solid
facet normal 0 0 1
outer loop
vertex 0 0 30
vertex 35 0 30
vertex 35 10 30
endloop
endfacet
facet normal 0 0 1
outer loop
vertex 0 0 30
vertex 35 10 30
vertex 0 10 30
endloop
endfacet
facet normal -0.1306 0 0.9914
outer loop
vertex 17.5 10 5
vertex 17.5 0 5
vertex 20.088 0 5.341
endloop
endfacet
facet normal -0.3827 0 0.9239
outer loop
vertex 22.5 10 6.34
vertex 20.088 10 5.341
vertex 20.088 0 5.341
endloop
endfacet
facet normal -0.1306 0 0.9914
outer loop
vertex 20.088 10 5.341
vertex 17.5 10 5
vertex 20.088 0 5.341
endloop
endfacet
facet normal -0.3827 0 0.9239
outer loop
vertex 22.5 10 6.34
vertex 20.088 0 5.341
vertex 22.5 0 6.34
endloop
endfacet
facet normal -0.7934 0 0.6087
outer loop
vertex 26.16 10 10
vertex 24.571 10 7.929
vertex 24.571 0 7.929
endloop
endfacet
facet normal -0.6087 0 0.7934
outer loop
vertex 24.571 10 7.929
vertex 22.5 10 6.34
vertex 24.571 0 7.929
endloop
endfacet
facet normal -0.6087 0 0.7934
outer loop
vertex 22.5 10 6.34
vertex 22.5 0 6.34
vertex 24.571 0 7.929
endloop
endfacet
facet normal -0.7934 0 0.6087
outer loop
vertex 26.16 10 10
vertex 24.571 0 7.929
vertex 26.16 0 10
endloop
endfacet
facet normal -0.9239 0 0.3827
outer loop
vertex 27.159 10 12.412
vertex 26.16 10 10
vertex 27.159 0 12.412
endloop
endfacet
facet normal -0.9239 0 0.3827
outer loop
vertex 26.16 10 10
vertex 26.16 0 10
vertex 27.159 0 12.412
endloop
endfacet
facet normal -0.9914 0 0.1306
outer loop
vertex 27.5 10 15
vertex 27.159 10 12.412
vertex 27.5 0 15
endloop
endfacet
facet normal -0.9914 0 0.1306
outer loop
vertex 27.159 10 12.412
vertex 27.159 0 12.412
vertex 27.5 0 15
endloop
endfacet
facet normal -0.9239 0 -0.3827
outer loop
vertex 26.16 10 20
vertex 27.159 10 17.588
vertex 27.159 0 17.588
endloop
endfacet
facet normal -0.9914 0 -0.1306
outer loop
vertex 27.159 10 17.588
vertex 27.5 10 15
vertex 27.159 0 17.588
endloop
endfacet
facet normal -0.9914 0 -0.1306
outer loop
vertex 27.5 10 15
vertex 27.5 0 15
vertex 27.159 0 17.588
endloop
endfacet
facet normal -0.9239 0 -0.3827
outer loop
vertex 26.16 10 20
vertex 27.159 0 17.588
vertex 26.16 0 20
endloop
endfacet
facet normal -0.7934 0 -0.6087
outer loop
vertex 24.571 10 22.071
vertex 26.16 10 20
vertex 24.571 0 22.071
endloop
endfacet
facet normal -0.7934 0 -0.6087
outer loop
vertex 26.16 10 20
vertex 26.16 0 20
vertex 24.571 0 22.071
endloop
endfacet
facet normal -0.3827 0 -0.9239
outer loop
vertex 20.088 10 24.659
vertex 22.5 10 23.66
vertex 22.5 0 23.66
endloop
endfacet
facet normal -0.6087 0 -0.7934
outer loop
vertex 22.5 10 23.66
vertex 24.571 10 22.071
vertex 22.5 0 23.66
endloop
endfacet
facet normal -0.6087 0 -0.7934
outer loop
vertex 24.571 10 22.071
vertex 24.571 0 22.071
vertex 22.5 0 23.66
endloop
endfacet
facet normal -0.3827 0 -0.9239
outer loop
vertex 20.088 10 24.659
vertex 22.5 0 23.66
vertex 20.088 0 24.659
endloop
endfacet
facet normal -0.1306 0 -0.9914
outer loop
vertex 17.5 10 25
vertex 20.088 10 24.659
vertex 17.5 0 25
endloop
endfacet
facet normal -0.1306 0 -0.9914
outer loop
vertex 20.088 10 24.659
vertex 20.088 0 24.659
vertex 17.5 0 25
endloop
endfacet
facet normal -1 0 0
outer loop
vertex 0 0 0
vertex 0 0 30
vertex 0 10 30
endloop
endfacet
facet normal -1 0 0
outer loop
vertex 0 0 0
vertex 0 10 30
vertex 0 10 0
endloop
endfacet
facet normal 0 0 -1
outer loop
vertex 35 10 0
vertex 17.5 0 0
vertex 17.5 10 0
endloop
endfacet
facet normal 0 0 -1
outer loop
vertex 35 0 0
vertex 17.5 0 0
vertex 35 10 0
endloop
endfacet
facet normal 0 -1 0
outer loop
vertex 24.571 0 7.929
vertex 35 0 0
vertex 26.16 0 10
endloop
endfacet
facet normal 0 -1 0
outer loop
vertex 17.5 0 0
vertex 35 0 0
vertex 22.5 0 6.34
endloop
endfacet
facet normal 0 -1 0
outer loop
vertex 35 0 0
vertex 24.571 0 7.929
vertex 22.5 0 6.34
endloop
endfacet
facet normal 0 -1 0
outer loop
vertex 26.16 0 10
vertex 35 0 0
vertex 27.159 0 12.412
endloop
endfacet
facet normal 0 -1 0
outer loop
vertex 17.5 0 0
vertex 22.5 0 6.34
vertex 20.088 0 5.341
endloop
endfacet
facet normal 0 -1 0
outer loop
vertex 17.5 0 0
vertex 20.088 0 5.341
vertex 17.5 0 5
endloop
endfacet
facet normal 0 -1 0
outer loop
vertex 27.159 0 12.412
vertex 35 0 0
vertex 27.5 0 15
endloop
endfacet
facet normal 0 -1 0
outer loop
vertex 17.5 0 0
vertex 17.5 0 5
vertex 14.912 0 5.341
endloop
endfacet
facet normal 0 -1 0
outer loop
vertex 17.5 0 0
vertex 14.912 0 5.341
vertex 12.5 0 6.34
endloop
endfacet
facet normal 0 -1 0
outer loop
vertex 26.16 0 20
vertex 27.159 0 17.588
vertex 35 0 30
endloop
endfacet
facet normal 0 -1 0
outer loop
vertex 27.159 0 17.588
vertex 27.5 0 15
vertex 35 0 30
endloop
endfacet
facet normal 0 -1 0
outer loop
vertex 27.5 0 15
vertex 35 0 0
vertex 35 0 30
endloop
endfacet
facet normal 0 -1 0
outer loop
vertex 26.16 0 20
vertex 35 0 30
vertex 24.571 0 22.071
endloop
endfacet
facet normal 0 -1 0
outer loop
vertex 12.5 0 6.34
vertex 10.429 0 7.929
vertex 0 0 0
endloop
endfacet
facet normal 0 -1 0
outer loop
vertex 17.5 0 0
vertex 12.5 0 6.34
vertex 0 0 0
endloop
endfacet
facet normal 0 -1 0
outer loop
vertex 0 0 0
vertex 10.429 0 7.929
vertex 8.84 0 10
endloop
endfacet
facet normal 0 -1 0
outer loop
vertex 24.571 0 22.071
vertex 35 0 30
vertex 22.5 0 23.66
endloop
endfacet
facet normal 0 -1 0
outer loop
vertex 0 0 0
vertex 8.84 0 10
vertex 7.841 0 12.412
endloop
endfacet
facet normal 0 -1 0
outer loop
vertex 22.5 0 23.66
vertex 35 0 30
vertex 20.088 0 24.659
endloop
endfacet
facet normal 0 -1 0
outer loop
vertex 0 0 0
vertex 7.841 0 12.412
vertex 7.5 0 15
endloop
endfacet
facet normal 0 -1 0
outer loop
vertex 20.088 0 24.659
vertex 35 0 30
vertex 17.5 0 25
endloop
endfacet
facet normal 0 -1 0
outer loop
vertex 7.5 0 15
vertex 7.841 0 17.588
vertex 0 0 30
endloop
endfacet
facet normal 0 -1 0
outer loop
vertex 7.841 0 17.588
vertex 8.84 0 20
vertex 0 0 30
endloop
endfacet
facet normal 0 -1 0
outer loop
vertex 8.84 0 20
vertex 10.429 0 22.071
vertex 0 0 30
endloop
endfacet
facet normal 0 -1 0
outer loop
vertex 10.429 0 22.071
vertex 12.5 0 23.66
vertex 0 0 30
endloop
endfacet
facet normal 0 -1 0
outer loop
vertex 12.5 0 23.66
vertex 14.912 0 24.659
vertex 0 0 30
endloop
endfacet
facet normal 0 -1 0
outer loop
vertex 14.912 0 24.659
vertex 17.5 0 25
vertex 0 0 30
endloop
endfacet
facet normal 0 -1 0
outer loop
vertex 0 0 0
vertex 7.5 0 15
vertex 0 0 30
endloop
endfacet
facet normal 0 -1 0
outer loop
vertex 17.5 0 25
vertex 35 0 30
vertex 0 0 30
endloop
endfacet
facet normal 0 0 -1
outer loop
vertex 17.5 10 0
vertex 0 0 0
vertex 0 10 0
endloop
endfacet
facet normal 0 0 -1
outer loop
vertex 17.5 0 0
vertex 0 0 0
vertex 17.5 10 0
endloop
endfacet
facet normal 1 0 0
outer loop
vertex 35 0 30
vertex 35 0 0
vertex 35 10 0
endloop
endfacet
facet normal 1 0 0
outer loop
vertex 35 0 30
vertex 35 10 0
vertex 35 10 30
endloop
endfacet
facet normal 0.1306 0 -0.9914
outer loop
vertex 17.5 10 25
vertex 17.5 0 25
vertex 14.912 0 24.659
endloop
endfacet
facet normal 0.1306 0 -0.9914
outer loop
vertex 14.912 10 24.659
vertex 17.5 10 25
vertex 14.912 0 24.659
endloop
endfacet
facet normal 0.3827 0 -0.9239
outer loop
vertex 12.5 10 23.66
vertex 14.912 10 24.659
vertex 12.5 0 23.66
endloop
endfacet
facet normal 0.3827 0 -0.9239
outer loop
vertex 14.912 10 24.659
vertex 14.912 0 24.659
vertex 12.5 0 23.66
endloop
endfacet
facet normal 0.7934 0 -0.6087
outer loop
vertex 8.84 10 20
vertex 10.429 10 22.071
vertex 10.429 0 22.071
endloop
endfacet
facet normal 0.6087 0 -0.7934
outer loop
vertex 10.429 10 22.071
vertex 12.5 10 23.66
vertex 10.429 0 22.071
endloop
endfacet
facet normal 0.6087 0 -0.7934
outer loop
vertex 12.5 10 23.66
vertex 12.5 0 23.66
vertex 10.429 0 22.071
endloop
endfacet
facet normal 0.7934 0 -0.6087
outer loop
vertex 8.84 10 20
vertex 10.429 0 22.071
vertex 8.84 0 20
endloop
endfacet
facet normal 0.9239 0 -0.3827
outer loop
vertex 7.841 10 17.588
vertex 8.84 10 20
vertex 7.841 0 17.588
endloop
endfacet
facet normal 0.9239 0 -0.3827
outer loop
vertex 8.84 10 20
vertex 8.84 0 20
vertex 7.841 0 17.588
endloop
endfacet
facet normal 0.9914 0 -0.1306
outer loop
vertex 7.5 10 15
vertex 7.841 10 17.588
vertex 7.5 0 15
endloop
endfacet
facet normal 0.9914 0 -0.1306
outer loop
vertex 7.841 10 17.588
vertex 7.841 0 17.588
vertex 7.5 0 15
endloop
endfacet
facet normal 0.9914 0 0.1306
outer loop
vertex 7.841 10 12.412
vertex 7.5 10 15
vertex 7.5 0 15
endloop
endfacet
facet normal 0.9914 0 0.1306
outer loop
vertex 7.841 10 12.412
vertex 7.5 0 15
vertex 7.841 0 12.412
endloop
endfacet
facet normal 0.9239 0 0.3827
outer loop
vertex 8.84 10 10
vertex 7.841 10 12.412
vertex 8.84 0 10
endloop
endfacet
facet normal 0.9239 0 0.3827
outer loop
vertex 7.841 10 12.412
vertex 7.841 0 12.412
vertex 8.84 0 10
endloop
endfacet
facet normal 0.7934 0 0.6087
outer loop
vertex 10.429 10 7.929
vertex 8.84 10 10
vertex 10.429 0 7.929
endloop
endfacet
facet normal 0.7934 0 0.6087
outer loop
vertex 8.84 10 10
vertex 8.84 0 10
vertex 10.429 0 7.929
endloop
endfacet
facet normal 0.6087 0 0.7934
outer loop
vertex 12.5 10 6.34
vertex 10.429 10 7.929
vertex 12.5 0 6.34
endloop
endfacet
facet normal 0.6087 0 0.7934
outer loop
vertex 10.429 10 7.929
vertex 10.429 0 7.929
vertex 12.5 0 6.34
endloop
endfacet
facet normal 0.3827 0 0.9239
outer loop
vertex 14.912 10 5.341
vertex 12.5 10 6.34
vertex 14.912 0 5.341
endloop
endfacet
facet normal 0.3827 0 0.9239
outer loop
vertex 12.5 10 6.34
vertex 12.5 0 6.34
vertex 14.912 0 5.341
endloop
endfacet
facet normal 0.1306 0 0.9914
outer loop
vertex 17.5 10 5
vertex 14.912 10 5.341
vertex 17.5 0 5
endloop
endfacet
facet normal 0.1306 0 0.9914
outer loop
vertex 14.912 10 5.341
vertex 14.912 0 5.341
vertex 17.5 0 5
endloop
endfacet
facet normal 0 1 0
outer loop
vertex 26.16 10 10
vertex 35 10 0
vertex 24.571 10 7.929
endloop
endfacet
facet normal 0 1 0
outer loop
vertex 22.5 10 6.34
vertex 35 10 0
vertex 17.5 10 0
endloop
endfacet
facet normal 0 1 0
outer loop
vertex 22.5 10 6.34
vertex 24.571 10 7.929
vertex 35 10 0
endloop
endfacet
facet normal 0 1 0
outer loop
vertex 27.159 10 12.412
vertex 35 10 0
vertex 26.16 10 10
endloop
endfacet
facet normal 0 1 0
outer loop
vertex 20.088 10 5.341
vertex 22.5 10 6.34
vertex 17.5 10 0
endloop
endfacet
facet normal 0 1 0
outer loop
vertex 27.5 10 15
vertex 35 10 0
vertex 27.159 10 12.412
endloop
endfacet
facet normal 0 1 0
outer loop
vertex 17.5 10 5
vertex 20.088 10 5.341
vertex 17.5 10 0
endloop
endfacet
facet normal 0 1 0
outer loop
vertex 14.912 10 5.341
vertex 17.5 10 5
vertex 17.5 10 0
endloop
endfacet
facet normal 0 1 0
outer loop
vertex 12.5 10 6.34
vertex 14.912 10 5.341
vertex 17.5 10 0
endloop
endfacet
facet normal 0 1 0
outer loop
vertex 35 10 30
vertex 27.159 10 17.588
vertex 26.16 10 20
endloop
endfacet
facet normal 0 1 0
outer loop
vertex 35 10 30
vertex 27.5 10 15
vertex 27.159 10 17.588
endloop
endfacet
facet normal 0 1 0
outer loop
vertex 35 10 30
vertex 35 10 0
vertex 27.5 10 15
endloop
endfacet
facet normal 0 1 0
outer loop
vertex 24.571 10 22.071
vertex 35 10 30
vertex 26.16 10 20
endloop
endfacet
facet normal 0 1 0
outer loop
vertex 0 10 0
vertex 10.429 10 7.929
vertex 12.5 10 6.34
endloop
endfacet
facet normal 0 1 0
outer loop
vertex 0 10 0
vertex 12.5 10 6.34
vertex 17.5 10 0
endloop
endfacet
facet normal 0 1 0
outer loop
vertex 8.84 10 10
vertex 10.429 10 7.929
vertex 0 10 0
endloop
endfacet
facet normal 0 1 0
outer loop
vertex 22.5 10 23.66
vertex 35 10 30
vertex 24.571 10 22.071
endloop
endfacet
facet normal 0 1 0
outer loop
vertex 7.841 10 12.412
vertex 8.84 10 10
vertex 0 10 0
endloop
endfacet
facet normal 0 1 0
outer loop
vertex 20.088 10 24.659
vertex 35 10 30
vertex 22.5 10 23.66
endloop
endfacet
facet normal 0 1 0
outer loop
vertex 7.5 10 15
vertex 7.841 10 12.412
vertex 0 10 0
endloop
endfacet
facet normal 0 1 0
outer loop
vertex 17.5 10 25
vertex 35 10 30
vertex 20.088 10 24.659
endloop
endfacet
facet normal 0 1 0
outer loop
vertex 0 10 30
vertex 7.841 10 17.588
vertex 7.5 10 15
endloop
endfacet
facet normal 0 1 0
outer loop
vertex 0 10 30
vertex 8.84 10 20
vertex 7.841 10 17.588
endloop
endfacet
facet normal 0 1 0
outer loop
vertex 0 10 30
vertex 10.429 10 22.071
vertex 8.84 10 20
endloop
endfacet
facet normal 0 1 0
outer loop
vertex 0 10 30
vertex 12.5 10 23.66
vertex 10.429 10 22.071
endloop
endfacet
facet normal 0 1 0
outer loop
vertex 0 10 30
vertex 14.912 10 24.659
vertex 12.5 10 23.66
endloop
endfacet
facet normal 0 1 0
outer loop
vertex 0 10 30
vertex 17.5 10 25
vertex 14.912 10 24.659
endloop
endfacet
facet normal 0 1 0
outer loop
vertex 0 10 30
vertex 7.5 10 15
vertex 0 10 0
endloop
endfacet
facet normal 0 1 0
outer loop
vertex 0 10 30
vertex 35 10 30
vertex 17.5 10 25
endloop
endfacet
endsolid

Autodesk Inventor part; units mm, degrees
ref_plane "YZ Plane" through (0, 0, 0) normal (1, 0, 0) x (0, 1, 0)
ref_plane "XZ Plane" through (0, 0, 0) normal (0, 1, 0) x (-1, 0, 0)
ref_plane "XY Plane" through (0, 0, 0) normal (0, 0, 1) x (1, 0, 0)
sketch "Эскиз1" plane through (0, 0, 0) normal (0, 1, 0) x (-1, 0, 0)
  line L0 (0, 0) -> (-35, 0)
  line L1 (-35, 0) -> (-35, 30)
  line L2 (-35, 30) -> (0, 30)
  line L3 (0, 30) -> (0, 0)
  line L4 (-17.5, 25) -> (-17.5, 0)
  line L5 (-17.5, 25) -> (-17.5, 15)
  circle A0 centre (-17.5, 15) radius 10
  dimension "d0" = 35
  dimension "d1" = 30
  dimension "d17" = 10
  dimension "d20" = 15
extrude "Выдавливание1" add sketch "Эскиз1" along normal blind 10
thread "Резьба2" size "M20x1.5" class "6H" standard "ISO Metric profile" full length
properties part number "Деталь перемещение по резьбе"
